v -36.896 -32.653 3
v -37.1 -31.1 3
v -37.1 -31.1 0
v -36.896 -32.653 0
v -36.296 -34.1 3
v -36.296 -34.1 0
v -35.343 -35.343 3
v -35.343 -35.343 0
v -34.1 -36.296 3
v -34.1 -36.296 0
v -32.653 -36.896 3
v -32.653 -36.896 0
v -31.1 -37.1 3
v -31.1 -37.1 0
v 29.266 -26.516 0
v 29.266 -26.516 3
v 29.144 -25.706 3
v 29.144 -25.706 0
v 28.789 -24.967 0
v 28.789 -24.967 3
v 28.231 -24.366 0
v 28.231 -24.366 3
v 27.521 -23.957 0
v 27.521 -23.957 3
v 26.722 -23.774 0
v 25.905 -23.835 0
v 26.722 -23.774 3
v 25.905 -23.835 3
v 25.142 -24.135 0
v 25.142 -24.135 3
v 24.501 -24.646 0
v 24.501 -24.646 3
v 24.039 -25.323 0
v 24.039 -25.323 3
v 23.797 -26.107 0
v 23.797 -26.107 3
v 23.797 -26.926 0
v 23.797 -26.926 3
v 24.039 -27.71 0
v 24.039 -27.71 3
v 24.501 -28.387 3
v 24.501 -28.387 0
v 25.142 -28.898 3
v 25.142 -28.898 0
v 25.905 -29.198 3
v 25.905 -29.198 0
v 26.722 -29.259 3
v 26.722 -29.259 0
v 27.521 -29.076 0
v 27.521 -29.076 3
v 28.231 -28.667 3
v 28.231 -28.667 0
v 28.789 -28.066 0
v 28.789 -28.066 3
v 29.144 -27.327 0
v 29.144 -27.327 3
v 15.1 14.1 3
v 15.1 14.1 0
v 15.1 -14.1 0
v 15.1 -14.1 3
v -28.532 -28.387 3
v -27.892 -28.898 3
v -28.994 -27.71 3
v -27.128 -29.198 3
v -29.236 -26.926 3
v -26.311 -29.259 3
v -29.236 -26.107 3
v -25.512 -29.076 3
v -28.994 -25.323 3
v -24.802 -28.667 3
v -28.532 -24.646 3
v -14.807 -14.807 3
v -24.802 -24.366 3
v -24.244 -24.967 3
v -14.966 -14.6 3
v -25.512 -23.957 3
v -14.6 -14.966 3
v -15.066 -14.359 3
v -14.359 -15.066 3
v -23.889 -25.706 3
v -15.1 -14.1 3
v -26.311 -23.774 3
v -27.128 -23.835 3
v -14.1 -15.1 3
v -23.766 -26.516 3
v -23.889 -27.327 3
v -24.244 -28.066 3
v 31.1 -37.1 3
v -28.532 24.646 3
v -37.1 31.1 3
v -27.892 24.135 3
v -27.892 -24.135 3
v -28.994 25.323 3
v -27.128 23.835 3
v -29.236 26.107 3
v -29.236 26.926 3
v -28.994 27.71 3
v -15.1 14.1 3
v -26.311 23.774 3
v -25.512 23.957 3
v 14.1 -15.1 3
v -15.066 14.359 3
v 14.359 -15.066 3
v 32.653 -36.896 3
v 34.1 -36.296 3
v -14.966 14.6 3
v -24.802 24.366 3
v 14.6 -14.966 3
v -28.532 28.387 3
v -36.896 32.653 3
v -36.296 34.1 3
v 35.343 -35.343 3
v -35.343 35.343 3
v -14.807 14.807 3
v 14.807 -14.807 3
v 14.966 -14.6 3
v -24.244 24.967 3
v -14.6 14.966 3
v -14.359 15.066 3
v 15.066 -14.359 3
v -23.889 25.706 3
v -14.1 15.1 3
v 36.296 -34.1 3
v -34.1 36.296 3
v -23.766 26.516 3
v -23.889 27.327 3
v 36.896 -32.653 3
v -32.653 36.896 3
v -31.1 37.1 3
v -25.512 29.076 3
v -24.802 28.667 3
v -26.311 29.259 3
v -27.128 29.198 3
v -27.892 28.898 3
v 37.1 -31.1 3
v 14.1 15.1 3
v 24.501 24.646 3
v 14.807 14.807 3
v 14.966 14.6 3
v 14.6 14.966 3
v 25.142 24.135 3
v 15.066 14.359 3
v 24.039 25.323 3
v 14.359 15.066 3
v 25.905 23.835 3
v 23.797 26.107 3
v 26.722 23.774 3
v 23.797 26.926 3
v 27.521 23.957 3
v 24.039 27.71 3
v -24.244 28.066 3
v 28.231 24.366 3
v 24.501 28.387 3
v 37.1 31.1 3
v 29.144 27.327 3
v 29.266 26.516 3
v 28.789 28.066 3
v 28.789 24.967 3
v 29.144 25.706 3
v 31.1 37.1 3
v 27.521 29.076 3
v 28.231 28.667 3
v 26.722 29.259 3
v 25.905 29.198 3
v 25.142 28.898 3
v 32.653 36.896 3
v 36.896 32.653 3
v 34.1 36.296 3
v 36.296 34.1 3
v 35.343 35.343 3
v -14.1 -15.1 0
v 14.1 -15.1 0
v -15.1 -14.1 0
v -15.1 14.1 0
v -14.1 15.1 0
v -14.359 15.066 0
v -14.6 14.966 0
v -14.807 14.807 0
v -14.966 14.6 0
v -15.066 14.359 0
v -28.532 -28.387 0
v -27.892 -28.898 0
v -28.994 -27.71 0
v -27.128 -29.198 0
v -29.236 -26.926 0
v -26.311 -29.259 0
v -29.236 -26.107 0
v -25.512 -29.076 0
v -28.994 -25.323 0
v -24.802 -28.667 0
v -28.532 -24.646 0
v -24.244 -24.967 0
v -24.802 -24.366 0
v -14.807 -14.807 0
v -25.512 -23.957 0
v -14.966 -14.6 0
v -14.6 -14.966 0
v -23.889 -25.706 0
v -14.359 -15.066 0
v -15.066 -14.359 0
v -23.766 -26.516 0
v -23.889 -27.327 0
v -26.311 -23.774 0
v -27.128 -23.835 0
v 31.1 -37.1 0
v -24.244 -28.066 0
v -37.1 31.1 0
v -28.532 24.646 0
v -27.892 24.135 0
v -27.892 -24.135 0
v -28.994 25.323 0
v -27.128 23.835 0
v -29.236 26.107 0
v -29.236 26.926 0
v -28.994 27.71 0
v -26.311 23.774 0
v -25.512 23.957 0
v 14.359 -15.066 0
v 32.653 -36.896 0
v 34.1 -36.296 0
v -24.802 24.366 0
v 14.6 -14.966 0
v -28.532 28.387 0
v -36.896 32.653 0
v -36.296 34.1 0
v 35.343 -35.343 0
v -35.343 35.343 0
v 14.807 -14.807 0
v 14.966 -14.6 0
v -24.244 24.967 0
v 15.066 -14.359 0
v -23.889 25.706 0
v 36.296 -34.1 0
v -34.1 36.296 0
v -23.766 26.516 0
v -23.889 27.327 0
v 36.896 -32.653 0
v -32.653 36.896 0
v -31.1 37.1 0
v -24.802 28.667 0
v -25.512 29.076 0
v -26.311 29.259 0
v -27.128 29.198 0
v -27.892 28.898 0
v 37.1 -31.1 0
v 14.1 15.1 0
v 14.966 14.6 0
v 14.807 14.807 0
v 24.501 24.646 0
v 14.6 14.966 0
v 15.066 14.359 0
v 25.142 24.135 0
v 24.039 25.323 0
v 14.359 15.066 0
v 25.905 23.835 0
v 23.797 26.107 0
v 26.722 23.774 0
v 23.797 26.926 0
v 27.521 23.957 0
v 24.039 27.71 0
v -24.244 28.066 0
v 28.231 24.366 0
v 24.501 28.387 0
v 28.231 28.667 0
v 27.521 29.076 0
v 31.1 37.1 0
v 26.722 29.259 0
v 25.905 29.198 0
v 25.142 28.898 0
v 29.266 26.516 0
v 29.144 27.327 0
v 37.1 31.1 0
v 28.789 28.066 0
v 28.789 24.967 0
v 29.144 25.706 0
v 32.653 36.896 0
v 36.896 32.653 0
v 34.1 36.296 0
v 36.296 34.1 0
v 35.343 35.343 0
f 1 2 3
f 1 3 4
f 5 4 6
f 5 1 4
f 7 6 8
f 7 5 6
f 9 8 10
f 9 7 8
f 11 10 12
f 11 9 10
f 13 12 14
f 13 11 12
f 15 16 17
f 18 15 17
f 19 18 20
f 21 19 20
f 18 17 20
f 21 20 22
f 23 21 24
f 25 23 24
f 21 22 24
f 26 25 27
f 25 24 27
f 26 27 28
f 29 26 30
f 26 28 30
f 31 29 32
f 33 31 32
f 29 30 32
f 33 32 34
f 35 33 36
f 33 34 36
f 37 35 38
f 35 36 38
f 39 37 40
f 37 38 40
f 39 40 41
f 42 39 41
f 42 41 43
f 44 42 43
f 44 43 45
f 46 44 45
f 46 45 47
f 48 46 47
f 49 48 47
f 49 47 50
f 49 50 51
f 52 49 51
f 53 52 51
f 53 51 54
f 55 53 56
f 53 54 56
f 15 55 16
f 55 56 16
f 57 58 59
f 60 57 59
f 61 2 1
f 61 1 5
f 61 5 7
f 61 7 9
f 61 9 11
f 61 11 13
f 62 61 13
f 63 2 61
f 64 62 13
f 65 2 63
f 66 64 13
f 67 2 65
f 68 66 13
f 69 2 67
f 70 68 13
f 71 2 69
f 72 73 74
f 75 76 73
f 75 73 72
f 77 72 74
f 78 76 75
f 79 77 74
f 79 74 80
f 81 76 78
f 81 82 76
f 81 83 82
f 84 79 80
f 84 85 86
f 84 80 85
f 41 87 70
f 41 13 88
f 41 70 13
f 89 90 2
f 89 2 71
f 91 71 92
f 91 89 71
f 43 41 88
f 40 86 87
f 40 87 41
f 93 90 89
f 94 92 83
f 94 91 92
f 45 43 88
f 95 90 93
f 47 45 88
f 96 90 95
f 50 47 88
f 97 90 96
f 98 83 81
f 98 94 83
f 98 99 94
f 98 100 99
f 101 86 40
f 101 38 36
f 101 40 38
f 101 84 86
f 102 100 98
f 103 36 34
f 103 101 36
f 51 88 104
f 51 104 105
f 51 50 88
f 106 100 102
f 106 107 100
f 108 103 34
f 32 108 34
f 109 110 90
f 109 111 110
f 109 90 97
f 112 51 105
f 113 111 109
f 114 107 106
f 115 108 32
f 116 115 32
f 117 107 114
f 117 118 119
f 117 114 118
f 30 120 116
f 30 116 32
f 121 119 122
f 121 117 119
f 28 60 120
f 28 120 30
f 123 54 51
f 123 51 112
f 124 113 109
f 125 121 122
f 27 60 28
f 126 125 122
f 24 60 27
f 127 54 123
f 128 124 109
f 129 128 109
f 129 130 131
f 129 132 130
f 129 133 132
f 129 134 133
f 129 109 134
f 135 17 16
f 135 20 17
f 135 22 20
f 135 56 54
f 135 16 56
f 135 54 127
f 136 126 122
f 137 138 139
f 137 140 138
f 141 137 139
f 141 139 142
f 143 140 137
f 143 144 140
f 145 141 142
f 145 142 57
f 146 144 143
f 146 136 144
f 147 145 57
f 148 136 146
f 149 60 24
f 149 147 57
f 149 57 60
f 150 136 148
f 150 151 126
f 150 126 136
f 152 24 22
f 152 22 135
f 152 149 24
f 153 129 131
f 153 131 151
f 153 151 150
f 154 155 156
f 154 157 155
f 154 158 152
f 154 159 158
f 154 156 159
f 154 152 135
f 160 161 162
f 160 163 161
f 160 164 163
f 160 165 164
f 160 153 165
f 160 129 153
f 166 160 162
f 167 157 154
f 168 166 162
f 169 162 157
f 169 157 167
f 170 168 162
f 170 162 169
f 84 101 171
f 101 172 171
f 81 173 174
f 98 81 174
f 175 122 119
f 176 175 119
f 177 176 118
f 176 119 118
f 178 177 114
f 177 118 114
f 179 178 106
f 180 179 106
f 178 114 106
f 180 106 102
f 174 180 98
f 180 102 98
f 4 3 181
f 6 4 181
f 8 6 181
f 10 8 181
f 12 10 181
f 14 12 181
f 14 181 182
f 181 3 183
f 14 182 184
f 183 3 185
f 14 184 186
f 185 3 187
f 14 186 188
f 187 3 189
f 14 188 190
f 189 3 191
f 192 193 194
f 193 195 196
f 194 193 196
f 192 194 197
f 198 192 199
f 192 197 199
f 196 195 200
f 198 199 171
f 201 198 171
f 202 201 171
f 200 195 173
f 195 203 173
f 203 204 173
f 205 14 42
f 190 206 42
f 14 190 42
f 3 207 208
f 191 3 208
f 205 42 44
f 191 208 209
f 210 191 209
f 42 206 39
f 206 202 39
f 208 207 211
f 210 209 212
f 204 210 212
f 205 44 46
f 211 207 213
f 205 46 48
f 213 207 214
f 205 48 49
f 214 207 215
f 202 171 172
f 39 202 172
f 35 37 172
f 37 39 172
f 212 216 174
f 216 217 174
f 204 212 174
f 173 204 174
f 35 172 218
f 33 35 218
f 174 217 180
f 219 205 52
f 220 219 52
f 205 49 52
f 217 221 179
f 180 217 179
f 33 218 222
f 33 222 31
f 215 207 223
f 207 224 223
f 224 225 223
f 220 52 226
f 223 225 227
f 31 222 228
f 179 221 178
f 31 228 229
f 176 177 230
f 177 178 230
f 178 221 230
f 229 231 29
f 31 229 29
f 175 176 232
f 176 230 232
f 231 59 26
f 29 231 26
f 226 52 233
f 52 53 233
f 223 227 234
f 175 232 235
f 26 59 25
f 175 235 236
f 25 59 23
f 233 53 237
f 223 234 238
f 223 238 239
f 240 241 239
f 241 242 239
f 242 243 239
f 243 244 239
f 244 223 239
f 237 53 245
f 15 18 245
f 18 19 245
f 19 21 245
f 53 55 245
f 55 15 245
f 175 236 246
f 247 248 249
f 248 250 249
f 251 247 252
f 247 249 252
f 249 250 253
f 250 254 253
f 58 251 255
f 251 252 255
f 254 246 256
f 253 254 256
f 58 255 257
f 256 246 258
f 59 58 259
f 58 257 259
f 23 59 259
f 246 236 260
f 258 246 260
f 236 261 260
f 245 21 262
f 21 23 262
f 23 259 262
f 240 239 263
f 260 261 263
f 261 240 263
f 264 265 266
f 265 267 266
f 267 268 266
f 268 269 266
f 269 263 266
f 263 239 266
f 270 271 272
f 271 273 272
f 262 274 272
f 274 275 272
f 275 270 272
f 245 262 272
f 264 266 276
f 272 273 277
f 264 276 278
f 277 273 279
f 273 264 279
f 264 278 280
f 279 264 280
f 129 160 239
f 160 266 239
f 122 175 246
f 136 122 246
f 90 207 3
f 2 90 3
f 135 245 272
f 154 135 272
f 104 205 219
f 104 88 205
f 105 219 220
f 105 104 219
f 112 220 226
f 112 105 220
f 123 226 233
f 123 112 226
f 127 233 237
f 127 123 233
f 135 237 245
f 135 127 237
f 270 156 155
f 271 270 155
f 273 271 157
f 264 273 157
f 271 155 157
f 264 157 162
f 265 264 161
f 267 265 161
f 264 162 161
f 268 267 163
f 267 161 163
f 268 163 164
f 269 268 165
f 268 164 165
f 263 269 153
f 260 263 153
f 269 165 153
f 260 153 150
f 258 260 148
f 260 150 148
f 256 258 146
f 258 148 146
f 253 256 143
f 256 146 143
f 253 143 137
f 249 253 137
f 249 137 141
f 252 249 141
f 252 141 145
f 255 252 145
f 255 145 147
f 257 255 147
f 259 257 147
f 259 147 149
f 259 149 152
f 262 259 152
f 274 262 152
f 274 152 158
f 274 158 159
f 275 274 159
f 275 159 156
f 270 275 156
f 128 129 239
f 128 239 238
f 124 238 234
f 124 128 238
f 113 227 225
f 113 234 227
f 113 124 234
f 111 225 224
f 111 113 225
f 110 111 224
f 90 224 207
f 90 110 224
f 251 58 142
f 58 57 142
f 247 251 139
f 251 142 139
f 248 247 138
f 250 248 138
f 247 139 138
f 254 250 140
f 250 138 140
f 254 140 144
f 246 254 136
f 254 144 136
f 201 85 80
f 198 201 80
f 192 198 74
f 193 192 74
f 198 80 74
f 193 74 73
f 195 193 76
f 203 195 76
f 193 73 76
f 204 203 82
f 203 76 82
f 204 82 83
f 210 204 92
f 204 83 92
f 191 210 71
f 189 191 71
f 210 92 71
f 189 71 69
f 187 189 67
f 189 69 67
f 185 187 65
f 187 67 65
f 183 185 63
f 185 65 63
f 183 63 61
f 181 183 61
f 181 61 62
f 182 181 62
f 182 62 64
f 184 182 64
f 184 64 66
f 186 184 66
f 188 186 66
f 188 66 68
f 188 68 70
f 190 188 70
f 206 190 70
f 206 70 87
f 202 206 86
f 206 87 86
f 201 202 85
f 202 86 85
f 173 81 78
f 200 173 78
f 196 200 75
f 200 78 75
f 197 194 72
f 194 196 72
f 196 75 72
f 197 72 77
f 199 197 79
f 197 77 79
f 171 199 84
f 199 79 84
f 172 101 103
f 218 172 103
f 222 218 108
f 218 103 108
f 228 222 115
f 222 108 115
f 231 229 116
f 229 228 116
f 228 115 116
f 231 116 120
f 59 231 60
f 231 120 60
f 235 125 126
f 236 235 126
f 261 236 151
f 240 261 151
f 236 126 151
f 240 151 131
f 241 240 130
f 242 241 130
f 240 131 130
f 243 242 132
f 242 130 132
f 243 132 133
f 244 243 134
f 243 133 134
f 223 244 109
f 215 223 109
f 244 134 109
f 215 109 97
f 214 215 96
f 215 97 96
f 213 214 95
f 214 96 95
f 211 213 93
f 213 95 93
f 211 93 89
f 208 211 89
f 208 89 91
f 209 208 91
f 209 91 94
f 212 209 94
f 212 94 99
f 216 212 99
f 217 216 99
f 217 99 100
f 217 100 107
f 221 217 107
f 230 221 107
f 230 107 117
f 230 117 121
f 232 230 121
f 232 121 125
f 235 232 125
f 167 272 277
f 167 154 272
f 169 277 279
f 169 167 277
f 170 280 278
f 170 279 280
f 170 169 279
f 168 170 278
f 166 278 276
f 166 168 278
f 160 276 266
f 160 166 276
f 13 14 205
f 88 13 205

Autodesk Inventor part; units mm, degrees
ref_plane "YZ Plane" through (0, 0, 0) normal (1, 0, 0) x (0, 1, 0)
ref_plane "XZ Plane" through (0, 0, 0) normal (0, 1, 0) x (-1, 0, 0)
ref_plane "XY Plane" through (0, 0, 0) normal (0, 0, 1) x (1, 0, 0)
sketch "Sketch1" plane through (0, 0, 0) normal (0, 0, 1) x (1, 0, 0)
  line L0 (-37.1, -37.1) -> (37.1, -37.1)
  line L1 (37.1, -37.1) -> (37.1, 37.1)
  line L2 (37.1, 37.1) -> (-37.1, 37.1)
  line L3 (-37.1, 37.1) -> (-37.1, -37.1)
  line L4 (-37.1, -37.1) -> (37.1, 37.1) construction
  line L5 (37.1, -37.1) -> (-37.1, 37.1) construction
  line L6 (15.1, -15.1) -> (-15.1, -15.1)
  line L7 (-15.1, -15.1) -> (-15.1, 15.1)
  line L8 (-15.1, 15.1) -> (15.1, 15.1)
  line L9 (15.1, 15.1) -> (15.1, -15.1)
  line L10 (15.1, -15.1) -> (-15.1, 15.1) construction
  line L11 (-15.1, -15.1) -> (15.1, 15.1) construction
  point P0 (0, 0)
  dimension "d172" = 30.2
  dimension "d181" = 22
  dimension "d187" = 22
extrude "Plate5" add sketch "Sketch1" along normal blind 3
sketch "Sketch9" plane through (0, 0, 3) normal (0, 0, 1) x (1, 0, 0)
  circle A0 centre (26.5165, -26.5165) radius 2.75
  line L0 (26.5165, 26.5165) -> (-26.5165, 26.5165) construction
  line L1 (-26.5165, 26.5165) -> (-26.5165, -26.5165) construction
  line L2 (-26.5165, -26.5165) -> (26.5165, -26.5165) construction
  line L3 (26.5165, -26.5165) -> (26.5165, 26.5165) construction
  line L4 (26.5165, 26.5165) -> (-26.5165, -26.5165) construction
  line L5 (-26.5165, 26.5165) -> (26.5165, -26.5165) construction
  circle A1 centre (-26.5165, -26.5165) radius 2.75
  circle A2 centre (26.5165, 26.5165) radius 2.75
  circle A3 centre (-26.5165, 26.5165) radius 2.75
  circle A4 centre (0, 0) radius 37.5 construction
  line L6 (-15.1, -15.1) -> (-15.1, 15.1) projected
  line L7 (-15.1, 15.1) -> (15.1, 15.1) projected
  line L8 (15.1, 15.1) -> (15.1, -15.1) projected
  line L9 (15.1, -15.1) -> (-15.1, -15.1) projected
  line L10 (37.1, -37.1) -> (-37.1, -37.1) projected
  line L11 (37.1, 37.1) -> (37.1, -37.1) projected
  line L12 (-37.1, 37.1) -> (37.1, 37.1) projected
  line L13 (-37.1, -37.1) -> (-37.1, 37.1) projected
  line L14 (-15, 15) -> (15, 15) construction
  line L15 (15, 15) -> (15, -15) construction
  line L16 (15, -15) -> (-15, -15) construction
  line L17 (-15, -15) -> (-15, 15) construction
  line L18 (-15, -15) -> (15, 15) construction
  dimension "d188" = 75
  dimension "d174" = 5.5
  dimension "d184" = 30
  dimension "d185" = 30
  dimension "d186" = 16.2868
extrude "Cut2" cut sketch "Sketch9" against normal blind 3 contours A0 | A1 | A2 | A3
fillet "Corner Round1" radius 6 4 edges at (37.1, 37.1, 1.5) (-37.1, 37.1, 1.5) (-37.1, -37.1, 1.5) (37.1, -37.1, 1.5)
fillet "Corner Round2" radius 1 4 edges at (-15.1, 15.1, 1.5) (-15.1, -15.1, 1.5) (15.1, -15.1, 1.5) (15.1, 15.1, 1.5)
properties part number "ANP 1425 FDS Way FLANGE" material "Stainless Steel"
